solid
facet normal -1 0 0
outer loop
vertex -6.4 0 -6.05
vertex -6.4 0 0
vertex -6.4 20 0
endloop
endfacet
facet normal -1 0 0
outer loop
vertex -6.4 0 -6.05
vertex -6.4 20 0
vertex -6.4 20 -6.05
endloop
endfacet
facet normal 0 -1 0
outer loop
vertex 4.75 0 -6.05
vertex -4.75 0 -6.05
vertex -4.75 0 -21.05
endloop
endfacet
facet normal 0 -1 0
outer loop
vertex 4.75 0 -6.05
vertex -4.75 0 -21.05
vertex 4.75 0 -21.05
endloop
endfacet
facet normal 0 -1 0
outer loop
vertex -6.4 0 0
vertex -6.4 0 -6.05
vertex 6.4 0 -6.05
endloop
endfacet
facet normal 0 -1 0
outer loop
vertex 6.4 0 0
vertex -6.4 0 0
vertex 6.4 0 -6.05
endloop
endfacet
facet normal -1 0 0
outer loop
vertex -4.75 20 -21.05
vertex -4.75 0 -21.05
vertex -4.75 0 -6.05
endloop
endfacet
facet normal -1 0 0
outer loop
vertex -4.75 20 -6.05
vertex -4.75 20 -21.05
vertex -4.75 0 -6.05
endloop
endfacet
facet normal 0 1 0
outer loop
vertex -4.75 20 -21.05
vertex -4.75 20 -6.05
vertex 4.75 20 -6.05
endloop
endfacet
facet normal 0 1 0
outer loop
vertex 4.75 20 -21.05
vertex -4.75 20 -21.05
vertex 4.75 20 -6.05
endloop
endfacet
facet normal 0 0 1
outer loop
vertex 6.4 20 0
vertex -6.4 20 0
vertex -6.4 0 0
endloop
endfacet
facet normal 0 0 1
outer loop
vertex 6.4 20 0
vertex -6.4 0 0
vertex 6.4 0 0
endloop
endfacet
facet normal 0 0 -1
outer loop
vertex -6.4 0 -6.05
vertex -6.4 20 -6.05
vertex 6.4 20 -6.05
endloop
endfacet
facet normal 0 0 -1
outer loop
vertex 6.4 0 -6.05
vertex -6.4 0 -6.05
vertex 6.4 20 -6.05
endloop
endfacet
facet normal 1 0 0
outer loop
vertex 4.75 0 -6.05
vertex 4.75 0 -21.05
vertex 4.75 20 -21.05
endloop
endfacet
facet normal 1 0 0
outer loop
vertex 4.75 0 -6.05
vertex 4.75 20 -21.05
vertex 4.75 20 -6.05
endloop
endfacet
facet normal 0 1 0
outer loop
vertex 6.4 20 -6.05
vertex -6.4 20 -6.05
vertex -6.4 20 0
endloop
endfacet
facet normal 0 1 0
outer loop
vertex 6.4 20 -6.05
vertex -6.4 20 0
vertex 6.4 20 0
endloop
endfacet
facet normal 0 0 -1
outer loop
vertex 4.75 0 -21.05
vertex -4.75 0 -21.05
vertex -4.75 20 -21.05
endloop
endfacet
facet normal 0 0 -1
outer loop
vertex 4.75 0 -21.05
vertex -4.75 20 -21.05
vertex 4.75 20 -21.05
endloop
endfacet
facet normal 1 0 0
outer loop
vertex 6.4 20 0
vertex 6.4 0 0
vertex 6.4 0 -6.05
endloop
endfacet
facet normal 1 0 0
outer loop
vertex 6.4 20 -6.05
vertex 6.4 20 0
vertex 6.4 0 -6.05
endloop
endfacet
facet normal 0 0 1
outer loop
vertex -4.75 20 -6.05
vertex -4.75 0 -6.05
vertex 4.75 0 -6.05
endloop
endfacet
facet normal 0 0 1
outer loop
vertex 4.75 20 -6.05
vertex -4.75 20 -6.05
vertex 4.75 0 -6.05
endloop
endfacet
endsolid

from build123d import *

# Parameters (mm, degrees)
SKETCH_1_W      = 12.8
SKETCH_1_H      = 6.05
EXTRUDE_1_DEPTH = 20
SKETCH_2_W      = 9.5
SKETCH_2_H      = 15
EXTRUDE_2_DEPTH = 20


with BuildPart() as part:
    # 草图1 → 凸台-拉伸1 (new body)
    with BuildSketch(Plane(origin=(0, 0, 0), x_dir=(1, 0, 0), z_dir=(0, 1, 0))):
        with Locations((0, 3.025)):
            Rectangle(SKETCH_1_W, SKETCH_1_H)
    extrude(amount=EXTRUDE_1_DEPTH)


with BuildPart() as body_2:
    # 草图2 → 凸台-拉伸2 (new body)
    with BuildSketch(Plane.XZ):
        with Locations((0, -13.55)):
            Rectangle(SKETCH_2_W, SKETCH_2_H)
    extrude(amount=-EXTRUDE_2_DEPTH)


solid = Compound([part.part, body_2.part])
